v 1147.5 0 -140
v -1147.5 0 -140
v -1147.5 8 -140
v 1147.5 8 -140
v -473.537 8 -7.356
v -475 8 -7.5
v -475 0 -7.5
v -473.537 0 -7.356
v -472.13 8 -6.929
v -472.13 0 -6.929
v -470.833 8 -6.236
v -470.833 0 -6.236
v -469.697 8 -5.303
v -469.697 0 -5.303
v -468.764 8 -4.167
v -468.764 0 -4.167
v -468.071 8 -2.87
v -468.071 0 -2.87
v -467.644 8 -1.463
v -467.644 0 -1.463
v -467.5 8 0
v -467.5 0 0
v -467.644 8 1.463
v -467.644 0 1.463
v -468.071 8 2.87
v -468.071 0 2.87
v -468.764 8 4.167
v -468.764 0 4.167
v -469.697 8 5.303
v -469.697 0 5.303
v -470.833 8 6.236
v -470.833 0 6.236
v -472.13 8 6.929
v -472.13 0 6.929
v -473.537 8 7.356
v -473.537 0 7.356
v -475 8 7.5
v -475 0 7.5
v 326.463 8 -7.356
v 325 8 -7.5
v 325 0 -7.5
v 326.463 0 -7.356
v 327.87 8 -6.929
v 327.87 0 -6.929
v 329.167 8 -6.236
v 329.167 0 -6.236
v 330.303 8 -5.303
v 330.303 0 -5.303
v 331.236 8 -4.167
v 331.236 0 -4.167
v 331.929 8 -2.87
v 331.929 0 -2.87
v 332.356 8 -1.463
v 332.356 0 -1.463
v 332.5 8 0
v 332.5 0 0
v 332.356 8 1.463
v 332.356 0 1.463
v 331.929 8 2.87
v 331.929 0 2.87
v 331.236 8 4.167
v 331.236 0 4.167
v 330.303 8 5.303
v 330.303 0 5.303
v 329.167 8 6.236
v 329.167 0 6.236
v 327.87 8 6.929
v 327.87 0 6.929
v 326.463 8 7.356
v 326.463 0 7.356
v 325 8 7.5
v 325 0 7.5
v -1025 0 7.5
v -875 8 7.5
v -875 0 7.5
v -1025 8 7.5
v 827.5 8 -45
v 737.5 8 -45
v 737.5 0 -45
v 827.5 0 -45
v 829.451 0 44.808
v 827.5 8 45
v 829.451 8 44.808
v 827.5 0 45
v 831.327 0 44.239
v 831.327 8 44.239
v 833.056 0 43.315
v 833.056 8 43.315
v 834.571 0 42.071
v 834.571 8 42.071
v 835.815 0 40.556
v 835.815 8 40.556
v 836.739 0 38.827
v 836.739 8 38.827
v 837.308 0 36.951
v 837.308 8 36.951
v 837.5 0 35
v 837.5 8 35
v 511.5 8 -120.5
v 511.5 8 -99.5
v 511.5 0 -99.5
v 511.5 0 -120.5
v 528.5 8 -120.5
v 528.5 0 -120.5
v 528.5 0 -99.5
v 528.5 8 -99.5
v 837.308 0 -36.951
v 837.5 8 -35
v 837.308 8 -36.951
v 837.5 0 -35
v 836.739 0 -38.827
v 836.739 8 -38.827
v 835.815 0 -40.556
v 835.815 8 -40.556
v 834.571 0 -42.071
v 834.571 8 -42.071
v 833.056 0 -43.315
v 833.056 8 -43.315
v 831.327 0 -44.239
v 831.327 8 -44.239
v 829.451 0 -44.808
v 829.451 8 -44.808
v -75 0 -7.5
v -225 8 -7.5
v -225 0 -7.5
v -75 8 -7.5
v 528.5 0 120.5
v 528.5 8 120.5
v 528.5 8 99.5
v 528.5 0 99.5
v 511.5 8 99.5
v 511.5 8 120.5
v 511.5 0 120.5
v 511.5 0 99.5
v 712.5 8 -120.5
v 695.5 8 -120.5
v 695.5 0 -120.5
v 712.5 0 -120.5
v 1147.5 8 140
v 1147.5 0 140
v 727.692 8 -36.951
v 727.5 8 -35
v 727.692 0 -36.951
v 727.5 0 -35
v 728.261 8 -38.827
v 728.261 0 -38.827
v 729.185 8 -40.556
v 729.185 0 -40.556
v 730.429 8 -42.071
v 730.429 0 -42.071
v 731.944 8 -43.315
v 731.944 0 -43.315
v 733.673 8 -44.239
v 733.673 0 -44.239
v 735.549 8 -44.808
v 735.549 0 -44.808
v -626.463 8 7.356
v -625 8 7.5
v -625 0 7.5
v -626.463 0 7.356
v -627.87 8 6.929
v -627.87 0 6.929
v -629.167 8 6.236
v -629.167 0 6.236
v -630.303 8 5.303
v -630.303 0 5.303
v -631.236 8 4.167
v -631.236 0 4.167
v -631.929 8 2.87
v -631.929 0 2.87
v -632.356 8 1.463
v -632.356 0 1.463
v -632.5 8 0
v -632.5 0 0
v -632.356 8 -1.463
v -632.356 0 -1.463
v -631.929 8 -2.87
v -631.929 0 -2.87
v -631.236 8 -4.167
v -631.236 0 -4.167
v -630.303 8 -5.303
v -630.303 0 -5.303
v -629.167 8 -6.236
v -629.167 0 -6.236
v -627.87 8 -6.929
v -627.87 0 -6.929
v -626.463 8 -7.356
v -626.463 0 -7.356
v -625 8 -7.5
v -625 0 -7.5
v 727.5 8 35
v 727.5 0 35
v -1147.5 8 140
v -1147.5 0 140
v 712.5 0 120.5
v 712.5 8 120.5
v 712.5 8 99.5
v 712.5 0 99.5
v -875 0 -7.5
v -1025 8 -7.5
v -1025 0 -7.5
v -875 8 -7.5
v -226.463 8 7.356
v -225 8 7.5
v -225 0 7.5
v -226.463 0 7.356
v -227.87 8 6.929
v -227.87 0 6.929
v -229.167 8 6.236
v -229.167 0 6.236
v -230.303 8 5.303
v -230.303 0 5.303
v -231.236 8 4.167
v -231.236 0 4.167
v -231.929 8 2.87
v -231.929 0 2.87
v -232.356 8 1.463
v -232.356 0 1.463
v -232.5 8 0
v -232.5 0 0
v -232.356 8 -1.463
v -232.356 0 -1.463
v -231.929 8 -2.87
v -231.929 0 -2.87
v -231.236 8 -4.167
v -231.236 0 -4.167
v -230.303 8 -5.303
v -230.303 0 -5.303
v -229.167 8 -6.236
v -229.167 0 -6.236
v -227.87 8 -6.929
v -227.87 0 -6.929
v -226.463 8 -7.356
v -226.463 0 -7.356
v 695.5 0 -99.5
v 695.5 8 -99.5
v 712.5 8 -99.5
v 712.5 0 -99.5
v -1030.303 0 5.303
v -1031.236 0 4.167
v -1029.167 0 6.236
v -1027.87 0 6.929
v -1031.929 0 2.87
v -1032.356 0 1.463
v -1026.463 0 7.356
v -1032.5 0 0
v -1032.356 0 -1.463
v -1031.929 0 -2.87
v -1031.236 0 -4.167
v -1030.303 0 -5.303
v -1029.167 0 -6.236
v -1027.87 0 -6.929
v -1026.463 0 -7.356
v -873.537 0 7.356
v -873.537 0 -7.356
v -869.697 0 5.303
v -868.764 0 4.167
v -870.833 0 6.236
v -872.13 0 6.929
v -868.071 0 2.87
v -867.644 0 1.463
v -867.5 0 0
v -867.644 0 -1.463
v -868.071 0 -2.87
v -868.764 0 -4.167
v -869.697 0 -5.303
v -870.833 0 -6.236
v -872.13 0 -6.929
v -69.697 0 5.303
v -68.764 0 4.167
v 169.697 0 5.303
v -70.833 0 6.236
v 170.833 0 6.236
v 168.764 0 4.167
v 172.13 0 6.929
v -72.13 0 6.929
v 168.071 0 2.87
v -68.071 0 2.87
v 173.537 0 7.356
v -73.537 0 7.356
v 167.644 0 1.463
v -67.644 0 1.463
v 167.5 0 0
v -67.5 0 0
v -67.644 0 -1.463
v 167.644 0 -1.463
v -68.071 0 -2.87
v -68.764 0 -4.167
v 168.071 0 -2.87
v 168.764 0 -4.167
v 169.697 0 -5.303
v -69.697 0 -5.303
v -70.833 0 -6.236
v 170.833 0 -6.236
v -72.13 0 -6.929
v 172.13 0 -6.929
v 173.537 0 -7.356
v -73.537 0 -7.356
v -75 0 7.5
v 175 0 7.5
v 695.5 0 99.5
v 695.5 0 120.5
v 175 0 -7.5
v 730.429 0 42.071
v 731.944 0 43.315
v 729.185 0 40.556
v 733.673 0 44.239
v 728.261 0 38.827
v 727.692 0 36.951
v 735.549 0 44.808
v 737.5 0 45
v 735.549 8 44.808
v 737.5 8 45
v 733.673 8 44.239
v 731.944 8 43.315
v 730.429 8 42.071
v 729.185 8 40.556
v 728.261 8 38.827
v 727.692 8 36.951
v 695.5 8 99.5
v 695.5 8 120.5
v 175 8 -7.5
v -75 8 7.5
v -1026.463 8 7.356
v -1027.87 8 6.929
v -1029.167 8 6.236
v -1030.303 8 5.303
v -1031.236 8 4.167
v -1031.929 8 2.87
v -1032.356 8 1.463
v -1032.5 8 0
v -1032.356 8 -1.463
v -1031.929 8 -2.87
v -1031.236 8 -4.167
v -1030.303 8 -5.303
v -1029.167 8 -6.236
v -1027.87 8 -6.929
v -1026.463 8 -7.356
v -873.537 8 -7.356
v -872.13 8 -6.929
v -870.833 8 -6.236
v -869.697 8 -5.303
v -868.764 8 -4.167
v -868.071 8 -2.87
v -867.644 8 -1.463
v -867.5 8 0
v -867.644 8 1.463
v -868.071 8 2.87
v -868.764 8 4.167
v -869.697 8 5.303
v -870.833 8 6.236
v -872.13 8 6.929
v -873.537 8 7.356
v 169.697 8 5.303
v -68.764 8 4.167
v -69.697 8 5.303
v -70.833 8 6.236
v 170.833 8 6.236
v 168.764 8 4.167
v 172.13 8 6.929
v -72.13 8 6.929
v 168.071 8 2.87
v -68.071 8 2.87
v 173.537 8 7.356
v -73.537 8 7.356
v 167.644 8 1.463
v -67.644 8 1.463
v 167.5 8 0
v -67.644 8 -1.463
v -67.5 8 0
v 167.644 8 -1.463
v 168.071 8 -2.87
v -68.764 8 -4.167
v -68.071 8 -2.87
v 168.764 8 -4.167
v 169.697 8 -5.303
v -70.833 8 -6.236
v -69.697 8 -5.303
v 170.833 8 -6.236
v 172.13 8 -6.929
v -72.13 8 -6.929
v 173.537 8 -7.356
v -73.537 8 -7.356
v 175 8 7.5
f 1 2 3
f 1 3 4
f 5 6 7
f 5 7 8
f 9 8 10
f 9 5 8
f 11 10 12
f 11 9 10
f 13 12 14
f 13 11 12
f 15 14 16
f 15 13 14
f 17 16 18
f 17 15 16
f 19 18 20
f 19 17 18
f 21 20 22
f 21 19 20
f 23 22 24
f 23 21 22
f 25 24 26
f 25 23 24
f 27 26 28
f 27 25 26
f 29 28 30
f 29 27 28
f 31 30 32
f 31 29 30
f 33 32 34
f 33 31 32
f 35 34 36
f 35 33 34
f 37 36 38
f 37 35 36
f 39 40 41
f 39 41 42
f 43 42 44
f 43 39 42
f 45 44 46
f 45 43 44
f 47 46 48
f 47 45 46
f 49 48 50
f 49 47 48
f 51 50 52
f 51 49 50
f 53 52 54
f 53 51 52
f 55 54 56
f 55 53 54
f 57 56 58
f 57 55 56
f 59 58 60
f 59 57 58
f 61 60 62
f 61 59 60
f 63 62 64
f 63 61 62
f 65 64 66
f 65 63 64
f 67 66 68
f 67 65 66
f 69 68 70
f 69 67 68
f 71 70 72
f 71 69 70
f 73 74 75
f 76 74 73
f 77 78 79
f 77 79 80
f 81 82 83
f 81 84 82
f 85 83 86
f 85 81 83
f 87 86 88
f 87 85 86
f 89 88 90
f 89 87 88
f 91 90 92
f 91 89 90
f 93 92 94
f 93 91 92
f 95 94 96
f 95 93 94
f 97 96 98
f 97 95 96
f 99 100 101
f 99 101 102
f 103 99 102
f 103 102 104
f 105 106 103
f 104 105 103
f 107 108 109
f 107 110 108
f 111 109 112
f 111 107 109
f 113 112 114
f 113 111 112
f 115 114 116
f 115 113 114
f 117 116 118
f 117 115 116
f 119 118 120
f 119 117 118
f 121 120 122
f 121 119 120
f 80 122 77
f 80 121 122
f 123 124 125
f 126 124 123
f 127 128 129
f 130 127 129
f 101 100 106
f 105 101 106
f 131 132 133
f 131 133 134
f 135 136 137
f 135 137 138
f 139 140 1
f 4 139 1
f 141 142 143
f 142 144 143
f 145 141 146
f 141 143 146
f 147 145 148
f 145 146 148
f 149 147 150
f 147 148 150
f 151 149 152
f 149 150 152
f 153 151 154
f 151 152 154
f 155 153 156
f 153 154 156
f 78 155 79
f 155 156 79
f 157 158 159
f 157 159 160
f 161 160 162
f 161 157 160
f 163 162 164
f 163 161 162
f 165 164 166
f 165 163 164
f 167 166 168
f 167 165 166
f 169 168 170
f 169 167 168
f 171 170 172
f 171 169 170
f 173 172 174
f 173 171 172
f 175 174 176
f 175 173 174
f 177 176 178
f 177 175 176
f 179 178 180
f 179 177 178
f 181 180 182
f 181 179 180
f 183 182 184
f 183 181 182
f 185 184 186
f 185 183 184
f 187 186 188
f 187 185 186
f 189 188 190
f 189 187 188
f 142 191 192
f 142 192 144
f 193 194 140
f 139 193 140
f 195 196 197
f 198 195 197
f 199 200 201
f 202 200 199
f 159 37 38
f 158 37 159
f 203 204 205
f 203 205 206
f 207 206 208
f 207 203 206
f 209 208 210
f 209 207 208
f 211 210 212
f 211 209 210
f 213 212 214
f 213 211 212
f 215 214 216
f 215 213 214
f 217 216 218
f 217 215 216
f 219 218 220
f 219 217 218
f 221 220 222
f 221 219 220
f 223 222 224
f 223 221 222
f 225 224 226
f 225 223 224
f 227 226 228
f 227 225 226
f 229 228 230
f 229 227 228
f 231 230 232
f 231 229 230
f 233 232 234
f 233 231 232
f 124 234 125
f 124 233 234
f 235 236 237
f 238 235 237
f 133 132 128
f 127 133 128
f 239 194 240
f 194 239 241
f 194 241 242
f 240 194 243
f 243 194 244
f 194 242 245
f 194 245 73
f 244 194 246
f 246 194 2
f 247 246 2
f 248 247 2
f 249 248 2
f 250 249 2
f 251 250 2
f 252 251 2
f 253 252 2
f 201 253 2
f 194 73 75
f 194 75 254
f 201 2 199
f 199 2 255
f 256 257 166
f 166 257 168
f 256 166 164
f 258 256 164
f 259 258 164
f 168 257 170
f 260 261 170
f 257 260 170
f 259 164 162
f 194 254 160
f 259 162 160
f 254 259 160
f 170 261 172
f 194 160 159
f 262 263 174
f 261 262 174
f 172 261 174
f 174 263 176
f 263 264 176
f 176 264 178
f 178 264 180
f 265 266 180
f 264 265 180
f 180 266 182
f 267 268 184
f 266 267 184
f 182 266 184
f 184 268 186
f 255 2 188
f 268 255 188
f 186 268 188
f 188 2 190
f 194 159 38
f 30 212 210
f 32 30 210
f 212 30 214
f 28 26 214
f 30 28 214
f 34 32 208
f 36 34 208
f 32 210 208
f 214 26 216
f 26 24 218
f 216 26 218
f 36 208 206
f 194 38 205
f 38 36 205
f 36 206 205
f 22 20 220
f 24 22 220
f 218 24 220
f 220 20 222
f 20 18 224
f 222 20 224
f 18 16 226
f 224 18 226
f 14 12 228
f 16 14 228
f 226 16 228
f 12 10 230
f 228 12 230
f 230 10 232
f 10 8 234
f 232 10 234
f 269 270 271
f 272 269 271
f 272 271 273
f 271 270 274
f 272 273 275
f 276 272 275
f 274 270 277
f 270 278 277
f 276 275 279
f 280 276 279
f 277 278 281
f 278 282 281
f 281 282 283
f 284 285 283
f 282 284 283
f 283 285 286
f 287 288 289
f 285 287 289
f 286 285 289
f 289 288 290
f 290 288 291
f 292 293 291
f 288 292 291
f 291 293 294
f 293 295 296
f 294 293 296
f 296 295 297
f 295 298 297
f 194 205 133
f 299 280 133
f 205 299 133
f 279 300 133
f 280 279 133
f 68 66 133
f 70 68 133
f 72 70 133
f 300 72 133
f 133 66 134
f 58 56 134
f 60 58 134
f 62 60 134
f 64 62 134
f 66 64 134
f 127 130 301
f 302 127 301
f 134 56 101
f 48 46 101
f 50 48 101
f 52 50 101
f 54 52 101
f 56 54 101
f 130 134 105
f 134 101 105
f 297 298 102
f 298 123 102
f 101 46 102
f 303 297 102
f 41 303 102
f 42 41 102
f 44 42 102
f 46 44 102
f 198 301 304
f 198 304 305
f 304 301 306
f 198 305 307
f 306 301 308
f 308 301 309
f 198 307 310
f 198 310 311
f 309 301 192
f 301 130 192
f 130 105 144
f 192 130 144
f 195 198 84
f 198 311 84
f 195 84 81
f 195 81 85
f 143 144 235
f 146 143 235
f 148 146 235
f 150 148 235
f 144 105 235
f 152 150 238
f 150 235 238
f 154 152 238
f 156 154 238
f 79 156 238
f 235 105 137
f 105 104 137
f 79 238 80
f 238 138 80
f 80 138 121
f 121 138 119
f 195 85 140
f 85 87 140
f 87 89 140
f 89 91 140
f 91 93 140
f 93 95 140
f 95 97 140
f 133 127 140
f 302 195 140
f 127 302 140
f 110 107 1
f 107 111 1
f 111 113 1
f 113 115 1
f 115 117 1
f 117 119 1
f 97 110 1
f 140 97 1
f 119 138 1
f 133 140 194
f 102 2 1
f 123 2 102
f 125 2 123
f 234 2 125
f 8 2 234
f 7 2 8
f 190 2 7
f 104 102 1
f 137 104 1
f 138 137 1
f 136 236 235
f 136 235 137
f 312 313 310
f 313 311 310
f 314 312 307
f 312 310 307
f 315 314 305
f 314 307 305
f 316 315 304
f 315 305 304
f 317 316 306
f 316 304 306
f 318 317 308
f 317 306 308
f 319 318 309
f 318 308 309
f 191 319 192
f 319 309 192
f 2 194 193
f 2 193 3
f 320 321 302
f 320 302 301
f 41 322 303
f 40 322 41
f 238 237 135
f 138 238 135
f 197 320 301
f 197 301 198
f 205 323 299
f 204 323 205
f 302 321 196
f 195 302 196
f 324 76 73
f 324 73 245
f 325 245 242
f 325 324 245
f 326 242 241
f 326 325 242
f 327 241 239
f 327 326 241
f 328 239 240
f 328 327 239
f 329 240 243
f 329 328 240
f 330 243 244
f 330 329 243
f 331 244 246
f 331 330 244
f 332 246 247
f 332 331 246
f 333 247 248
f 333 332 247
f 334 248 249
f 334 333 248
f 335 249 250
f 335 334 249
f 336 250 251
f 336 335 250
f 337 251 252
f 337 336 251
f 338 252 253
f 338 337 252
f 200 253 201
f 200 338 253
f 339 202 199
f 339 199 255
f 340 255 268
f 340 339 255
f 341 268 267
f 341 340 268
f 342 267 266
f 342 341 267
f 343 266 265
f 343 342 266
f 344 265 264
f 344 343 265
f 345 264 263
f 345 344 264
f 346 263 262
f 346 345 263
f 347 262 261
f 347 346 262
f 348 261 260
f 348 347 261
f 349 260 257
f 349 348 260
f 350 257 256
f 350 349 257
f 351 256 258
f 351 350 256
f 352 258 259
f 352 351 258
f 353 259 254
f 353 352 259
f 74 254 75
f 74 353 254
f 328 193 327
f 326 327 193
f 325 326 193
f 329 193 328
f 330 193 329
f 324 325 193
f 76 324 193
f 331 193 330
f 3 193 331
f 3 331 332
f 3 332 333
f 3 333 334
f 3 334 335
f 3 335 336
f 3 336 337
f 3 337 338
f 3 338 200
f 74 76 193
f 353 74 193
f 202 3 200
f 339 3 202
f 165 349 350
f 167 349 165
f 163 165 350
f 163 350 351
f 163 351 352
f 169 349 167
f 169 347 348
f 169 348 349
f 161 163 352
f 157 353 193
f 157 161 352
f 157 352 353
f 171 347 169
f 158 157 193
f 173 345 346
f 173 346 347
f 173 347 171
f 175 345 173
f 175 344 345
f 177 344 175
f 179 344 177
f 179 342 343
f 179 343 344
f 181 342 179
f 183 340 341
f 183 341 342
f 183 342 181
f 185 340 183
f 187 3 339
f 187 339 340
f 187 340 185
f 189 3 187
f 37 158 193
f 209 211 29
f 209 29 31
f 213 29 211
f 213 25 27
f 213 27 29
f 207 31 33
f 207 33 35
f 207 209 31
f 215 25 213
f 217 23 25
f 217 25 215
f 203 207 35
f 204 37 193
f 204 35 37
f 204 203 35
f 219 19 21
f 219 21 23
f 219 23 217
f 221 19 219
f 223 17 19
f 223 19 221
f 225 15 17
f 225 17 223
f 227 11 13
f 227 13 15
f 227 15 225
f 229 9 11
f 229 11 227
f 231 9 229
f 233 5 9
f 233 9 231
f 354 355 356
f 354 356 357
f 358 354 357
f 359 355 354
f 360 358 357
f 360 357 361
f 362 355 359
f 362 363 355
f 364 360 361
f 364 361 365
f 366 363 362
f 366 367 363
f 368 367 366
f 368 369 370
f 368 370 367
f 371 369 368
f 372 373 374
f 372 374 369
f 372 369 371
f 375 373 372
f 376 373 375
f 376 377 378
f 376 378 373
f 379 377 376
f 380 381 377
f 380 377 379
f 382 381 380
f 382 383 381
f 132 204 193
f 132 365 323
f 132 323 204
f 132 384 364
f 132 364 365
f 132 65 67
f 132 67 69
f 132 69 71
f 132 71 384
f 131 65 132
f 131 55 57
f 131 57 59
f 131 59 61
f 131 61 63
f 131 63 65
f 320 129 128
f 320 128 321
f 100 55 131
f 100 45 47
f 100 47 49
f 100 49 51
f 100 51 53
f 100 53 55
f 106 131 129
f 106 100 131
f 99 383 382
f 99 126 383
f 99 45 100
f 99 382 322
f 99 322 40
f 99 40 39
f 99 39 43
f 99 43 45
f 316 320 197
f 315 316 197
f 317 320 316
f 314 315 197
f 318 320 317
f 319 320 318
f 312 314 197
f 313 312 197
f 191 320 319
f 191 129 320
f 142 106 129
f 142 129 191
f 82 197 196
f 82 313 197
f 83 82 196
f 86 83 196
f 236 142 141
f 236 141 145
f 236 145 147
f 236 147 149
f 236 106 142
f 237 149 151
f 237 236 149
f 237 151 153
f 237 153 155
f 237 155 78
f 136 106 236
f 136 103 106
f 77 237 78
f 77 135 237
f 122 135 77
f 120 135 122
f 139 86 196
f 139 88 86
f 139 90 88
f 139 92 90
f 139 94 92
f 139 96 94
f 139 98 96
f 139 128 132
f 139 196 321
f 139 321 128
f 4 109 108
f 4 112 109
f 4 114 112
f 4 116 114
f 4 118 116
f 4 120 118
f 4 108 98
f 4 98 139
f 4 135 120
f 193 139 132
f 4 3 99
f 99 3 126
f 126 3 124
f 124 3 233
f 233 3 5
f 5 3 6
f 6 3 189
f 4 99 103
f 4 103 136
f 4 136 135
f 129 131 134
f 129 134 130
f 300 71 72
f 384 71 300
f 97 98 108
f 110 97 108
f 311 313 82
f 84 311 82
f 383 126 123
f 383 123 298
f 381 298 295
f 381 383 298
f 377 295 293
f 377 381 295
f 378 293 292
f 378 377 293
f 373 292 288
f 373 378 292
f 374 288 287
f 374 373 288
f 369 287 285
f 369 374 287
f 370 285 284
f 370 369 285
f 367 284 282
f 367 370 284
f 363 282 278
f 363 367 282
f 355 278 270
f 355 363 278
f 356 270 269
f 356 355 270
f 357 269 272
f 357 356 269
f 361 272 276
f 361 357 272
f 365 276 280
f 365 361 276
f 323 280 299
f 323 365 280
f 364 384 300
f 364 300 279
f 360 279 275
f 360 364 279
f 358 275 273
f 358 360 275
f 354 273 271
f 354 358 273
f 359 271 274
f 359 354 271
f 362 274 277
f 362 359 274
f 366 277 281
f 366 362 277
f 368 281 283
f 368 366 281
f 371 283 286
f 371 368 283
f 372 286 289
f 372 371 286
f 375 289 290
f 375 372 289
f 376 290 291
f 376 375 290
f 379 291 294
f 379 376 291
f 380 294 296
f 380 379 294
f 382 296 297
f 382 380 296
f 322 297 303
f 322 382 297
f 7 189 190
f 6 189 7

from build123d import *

# Parameters (mm, degrees)
SKETCH_1_W             = 2295
SKETCH_1_H             = 280
EXTRUDE_1_DEPTH        = 8
CUT_EXTRUDE_1_DEPTH    = 8
PATTERN_LINEAR_1_COUNT = 4
PATTERN_LINEAR_1_PITCH = 400
SKETCH_3_W             = 110
SKETCH_3_H             = 90
CUT_EXTRUDE_2_DEPTH    = 8
SKETCH_4_W             = 17
SKETCH_4_H             = 21
CUT_EXTRUDE_3_DEPTH    = 8
FILLET_1_R             = 10


with BuildPart() as part:
    # 草图1 → 凸台-拉伸1 (new body)
    with BuildSketch(Plane(origin=(0, 0, 0), x_dir=(1, 0, 0), z_dir=(0, 1, 0))):
        Rectangle(SKETCH_1_W, SKETCH_1_H)
    extrude(amount=EXTRUDE_1_DEPTH)

    # 草图2 → 切除-拉伸1 (cut)
    with BuildSketch(Plane(origin=(0, 8, 0), x_dir=(1, 0, 0), z_dir=(0, 1, 0))):
        with BuildLine():
            Line((-1025, 7.5), (-875, 7.5))
            ThreePointArc((-875, 7.5), (-867.5, 0), (-875, -7.5))
            Line((-875, -7.5), (-1025, -7.5))
            ThreePointArc((-1025, -7.5), (-1032.5, 0), (-1025, 7.5))
        make_face()
    cut_extrude_1 = extrude(amount=-CUT_EXTRUDE_1_DEPTH, mode=Mode.SUBTRACT)

    # 阵列(线性)1: 切除-拉伸1 ×4
    with Locations(*[(i * PATTERN_LINEAR_1_PITCH, 0, 0) for i in range(1, PATTERN_LINEAR_1_COUNT)]):
        add(cut_extrude_1, mode=Mode.SUBTRACT)

    # 草图3 → 切除-拉伸2 (cut)
    with BuildSketch(Plane(origin=(0, 8, 0), x_dir=(1, 0, 0), z_dir=(0, 1, 0))):
        with Locations((782.5, 0)):
            Rectangle(SKETCH_3_W, SKETCH_3_H)
    extrude(amount=-CUT_EXTRUDE_2_DEPTH, mode=Mode.SUBTRACT)

    # 草图4 → 切除-拉伸3 (cut)
    with BuildSketch(Plane(origin=(0, 8, 0), x_dir=(1, 0, 0), z_dir=(0, 1, 0))):
        with Locations((704, -110)):
            Rectangle(SKETCH_4_W, SKETCH_4_H)
        with Locations((520, -110)):
            Rectangle(SKETCH_4_W, SKETCH_4_H)
        with Locations((520, 110)):
            Rectangle(SKETCH_4_W, SKETCH_4_H)
        with Locations((704, 110)):
            Rectangle(SKETCH_4_W, SKETCH_4_H)
    extrude(amount=-CUT_EXTRUDE_3_DEPTH, mode=Mode.SUBTRACT)

    # 圆角1
    fillet_1_edges = [part.edges().sort_by_distance(p)[0] for p in [
        (837.5, 4, -45),
        (837.5, 4, 45),
        (727.5, 4, 45),
        (727.5, 4, -45),
    ]]
    fillet(fillet_1_edges, radius=FILLET_1_R)


solid = part.part
